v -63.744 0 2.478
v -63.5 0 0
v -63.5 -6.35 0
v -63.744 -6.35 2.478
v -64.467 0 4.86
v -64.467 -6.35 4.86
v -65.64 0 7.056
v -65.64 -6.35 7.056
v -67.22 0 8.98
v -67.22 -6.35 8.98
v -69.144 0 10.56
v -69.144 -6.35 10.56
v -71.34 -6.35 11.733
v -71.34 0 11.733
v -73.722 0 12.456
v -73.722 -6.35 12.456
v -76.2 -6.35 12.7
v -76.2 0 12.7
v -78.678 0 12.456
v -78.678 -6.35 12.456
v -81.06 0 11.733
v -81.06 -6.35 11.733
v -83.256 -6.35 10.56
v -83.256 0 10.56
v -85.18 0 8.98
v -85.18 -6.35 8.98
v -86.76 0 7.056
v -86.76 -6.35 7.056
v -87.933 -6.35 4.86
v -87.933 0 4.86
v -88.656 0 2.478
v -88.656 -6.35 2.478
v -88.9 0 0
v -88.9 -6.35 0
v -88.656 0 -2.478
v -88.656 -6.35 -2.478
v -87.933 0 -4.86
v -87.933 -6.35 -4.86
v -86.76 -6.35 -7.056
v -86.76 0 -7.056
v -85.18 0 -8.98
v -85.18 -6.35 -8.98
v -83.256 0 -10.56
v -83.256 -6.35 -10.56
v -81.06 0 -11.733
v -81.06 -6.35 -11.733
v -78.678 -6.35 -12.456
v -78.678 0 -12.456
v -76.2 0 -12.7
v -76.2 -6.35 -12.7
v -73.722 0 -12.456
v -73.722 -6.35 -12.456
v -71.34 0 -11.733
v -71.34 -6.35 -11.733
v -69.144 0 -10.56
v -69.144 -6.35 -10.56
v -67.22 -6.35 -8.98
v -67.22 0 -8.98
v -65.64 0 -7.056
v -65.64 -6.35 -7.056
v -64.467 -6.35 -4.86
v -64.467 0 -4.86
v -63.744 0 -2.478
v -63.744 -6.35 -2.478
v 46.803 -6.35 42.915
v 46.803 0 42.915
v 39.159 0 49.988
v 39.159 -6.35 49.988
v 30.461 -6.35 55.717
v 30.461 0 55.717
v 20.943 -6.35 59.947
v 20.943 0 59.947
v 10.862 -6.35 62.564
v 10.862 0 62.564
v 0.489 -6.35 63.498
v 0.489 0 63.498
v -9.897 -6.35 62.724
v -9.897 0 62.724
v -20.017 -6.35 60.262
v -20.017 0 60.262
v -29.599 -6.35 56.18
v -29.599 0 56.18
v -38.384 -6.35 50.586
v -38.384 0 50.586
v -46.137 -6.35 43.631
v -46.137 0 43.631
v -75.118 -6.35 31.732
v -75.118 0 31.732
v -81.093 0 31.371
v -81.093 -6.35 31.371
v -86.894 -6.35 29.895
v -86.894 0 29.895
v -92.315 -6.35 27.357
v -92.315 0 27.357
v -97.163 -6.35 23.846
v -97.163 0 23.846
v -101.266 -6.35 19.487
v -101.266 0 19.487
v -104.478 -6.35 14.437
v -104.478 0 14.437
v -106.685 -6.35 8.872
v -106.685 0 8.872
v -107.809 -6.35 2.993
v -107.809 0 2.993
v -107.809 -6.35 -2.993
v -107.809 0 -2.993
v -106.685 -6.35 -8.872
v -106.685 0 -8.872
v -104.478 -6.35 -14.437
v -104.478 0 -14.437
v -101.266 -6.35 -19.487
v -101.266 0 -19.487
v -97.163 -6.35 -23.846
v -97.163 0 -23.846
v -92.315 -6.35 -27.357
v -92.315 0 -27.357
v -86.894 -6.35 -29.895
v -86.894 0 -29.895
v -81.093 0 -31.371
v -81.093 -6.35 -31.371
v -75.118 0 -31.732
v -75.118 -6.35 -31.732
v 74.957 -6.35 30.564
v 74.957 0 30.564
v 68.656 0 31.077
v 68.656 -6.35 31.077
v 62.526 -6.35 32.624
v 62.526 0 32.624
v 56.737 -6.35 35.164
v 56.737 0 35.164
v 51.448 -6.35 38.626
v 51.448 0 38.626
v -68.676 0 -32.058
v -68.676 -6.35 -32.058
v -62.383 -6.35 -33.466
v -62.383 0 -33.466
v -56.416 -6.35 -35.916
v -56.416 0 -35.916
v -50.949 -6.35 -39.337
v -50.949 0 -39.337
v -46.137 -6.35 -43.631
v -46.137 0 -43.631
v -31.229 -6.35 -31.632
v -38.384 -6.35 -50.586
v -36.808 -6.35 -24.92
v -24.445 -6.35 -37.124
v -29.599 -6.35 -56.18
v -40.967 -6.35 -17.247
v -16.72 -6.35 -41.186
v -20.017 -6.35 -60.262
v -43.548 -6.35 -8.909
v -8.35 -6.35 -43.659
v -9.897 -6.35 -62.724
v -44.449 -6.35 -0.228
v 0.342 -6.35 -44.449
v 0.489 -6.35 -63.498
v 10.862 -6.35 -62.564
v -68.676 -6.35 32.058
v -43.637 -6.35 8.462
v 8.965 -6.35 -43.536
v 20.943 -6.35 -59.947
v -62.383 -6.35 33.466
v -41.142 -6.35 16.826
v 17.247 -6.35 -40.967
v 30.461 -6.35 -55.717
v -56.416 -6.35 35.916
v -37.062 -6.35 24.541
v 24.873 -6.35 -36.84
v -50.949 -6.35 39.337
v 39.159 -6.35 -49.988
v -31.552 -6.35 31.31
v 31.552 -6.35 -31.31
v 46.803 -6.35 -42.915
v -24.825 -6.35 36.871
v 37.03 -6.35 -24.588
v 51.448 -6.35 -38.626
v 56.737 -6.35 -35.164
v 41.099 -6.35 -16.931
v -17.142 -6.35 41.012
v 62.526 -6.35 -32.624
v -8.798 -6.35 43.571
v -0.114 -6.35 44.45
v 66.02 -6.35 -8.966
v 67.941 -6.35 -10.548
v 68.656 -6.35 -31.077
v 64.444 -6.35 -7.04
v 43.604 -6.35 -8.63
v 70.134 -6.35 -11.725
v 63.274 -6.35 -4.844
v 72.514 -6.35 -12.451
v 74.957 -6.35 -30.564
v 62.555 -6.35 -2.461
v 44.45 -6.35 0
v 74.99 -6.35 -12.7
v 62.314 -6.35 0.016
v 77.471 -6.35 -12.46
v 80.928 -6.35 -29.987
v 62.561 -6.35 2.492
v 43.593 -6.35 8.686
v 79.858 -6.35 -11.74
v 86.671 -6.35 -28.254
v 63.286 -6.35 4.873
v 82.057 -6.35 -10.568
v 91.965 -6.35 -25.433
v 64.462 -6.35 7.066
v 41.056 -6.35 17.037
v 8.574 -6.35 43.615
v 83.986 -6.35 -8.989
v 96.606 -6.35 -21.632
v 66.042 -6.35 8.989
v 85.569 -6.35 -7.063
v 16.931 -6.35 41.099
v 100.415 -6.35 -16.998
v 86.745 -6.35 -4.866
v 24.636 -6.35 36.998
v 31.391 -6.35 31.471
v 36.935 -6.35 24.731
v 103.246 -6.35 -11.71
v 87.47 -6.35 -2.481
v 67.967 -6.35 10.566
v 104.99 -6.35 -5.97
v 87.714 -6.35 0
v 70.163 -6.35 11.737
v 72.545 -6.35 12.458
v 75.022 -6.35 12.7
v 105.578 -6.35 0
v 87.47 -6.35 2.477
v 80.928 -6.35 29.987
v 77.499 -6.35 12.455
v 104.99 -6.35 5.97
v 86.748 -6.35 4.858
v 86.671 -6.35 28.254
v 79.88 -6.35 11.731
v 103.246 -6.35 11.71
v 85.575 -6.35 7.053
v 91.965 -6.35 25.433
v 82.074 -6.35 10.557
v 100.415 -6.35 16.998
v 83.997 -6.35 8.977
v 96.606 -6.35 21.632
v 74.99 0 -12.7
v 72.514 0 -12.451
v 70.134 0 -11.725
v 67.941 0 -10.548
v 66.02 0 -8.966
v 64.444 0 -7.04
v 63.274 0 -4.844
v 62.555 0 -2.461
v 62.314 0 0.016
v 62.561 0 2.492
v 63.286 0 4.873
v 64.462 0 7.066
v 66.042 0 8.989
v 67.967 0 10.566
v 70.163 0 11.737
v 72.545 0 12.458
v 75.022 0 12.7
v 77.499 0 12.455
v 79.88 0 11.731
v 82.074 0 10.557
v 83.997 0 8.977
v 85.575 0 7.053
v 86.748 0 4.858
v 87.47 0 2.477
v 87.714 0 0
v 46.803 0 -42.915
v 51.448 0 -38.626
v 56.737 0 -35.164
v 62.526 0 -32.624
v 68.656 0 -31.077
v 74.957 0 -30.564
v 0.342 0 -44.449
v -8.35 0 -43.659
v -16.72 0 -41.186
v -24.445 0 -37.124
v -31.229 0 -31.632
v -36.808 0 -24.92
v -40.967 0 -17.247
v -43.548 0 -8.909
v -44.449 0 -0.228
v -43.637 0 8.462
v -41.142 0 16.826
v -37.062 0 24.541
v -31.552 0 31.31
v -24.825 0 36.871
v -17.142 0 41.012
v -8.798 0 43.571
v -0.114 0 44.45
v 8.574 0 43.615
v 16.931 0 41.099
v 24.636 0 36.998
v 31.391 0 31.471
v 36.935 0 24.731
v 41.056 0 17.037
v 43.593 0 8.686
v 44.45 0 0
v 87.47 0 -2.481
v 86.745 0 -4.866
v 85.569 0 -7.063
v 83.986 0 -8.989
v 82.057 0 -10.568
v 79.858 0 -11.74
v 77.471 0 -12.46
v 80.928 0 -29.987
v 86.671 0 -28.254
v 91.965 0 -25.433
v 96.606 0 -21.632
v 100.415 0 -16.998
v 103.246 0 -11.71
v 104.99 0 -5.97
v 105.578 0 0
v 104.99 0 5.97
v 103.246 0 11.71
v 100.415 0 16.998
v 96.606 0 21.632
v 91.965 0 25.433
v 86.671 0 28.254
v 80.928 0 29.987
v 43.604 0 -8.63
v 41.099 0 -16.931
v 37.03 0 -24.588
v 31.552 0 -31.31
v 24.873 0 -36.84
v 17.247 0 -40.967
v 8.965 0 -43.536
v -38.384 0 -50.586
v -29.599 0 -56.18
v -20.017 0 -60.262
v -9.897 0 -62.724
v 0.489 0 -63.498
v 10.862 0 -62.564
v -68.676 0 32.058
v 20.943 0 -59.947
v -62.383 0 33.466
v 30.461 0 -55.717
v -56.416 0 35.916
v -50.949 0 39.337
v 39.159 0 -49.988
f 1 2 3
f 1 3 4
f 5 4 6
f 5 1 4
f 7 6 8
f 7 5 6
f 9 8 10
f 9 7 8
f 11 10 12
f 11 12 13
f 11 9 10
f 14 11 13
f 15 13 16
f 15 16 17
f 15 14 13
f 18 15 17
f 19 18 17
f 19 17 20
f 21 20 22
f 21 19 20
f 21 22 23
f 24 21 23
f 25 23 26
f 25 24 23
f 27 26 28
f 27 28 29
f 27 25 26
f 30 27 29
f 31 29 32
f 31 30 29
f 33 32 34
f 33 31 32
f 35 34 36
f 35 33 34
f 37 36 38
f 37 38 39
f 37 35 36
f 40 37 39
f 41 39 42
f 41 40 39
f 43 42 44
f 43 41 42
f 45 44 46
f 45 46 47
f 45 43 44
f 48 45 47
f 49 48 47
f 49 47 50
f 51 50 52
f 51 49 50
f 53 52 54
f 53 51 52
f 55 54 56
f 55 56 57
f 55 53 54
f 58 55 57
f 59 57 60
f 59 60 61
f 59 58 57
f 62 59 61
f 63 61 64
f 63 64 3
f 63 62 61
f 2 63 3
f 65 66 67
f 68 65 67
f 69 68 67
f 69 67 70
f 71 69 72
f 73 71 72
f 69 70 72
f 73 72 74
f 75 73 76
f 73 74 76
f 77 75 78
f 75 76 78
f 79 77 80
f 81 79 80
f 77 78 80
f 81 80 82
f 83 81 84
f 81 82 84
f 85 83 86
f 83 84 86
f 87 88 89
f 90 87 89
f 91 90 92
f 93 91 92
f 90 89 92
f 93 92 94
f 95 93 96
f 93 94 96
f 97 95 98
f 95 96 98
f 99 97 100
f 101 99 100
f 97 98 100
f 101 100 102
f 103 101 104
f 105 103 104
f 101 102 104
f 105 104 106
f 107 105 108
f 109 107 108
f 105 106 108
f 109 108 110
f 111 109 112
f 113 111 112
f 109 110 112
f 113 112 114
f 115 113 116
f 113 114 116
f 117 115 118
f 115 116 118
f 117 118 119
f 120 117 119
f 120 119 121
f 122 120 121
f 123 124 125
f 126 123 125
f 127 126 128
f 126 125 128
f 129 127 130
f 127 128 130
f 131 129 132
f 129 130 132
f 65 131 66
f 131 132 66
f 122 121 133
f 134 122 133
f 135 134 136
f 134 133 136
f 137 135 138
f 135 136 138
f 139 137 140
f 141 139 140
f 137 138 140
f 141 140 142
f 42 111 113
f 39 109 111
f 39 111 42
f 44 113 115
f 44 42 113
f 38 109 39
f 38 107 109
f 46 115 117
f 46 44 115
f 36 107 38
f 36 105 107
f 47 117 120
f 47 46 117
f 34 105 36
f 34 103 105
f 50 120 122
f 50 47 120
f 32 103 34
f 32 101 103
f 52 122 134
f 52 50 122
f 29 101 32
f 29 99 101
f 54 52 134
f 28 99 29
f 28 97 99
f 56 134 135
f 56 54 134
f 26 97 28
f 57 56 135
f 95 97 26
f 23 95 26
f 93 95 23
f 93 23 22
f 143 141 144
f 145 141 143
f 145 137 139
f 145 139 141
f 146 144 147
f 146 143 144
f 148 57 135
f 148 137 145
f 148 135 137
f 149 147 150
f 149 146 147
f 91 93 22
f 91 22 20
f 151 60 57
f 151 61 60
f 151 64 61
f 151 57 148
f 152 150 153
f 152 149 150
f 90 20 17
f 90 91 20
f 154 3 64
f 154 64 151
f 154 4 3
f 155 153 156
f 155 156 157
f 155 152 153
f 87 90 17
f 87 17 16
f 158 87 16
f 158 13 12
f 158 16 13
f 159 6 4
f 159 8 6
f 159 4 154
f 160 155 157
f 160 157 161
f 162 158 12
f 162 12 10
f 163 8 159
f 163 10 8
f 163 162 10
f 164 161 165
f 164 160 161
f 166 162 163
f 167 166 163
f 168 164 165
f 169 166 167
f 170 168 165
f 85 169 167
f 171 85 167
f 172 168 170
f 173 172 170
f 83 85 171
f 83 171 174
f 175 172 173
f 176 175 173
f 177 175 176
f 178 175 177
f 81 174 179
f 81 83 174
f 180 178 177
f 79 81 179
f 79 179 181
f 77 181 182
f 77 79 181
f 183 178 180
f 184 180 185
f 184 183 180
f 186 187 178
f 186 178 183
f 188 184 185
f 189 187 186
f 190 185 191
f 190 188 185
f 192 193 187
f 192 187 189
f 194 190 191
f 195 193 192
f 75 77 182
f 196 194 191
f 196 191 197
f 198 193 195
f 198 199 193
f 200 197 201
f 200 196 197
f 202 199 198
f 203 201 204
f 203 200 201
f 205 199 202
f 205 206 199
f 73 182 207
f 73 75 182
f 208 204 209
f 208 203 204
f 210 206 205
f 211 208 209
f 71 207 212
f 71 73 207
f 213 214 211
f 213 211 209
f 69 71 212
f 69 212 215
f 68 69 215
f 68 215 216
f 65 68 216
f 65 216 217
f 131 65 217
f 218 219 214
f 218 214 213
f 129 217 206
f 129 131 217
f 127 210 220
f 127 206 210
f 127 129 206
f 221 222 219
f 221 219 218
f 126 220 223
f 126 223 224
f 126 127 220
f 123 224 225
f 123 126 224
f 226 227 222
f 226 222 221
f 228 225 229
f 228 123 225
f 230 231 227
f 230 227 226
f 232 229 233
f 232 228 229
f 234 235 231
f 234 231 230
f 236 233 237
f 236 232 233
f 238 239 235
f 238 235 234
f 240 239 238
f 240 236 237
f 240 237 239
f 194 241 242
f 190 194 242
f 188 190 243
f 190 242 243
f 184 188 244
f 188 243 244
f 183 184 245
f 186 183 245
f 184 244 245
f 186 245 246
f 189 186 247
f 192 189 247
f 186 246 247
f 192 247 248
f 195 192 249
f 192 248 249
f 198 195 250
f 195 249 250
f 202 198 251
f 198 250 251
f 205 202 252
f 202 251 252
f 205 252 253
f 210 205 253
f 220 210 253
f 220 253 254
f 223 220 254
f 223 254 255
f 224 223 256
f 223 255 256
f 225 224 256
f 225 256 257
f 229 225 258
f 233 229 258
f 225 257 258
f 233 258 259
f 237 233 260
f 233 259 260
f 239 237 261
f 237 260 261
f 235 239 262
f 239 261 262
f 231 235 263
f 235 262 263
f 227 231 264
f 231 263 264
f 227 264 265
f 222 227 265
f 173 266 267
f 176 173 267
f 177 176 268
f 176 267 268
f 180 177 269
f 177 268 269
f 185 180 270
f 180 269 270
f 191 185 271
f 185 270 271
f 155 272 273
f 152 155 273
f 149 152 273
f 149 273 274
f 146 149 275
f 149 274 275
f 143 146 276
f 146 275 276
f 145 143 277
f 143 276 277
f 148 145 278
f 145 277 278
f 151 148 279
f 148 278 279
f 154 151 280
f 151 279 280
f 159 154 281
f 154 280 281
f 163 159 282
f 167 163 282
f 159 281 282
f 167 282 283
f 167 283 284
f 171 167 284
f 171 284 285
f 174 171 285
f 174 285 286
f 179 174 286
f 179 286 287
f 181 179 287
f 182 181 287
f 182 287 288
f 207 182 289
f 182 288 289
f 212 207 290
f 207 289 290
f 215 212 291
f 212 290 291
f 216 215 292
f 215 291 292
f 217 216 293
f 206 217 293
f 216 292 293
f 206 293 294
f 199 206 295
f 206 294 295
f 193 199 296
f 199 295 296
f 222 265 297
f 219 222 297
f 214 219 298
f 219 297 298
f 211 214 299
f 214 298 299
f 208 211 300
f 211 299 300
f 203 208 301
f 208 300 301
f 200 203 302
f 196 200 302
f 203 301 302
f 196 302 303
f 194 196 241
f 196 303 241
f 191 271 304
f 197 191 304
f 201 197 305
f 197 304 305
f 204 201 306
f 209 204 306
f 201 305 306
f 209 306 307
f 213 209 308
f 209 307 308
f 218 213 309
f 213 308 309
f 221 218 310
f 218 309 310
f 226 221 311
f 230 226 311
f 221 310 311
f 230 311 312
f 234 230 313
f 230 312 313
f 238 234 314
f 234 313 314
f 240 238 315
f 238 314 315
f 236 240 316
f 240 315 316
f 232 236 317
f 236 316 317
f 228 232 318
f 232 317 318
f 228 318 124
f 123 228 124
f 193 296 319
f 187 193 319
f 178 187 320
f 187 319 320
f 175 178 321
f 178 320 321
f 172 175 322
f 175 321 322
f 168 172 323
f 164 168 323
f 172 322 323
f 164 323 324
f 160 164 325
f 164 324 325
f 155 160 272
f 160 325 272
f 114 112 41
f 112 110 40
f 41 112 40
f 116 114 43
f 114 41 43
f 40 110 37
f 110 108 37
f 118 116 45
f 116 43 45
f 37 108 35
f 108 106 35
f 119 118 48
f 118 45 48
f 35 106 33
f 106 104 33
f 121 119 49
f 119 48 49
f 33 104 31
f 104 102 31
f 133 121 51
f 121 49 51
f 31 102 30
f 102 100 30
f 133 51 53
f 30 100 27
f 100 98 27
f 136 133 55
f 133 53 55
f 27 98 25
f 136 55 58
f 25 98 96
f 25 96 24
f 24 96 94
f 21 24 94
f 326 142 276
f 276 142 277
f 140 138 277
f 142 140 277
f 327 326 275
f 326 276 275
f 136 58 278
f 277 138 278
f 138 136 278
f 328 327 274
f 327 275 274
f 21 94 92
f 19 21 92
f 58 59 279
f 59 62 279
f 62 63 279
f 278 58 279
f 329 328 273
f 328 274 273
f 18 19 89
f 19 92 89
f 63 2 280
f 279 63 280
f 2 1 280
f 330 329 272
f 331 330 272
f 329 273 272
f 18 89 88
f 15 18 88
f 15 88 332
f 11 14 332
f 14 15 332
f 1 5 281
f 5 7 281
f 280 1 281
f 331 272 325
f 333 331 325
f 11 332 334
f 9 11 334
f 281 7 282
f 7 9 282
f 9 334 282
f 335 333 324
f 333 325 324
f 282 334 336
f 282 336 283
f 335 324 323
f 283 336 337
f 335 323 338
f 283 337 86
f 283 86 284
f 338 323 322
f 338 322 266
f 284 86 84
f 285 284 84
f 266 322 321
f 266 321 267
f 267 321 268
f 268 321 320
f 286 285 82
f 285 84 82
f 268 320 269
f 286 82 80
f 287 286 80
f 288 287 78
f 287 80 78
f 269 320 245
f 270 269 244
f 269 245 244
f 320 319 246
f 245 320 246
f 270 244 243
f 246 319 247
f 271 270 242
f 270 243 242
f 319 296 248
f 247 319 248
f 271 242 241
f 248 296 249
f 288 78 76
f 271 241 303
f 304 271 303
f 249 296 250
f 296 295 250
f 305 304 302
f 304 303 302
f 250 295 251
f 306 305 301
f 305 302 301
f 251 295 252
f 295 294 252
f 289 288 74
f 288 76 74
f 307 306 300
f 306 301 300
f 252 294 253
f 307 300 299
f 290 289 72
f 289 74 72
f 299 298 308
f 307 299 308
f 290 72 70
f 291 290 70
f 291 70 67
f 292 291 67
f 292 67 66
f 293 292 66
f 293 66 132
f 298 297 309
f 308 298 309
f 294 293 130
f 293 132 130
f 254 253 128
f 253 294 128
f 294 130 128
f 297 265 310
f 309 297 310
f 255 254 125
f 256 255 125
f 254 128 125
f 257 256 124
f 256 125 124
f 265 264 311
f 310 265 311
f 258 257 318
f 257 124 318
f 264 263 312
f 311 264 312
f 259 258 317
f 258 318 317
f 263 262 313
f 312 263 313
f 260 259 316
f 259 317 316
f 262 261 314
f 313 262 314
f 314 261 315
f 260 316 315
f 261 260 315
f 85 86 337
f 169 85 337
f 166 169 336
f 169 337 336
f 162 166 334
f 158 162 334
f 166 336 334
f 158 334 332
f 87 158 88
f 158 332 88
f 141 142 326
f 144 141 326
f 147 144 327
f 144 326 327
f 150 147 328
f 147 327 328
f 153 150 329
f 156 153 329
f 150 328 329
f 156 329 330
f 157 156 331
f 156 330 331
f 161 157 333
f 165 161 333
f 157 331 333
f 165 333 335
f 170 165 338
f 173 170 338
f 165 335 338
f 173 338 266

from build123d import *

# Parameters (mm, degrees)
F0_R     = 12.7
F1_DEPTH = 6.35


# Not quite as in the source:
# - a length typed as a fraction of an inch, garbled in the dataset ("3 / 203.2 mm" for 3/8 in), is restored


with BuildPart() as f1:
    # F0 (on Front) → F1 (new body)
    with BuildSketch(Plane.XZ):
        with BuildLine():
            ThreePointArc((-46.13671875, -43.6308741946), (-24.8918341596, -58.4178619274), (0.4890866537, -63.4981164622))
            ThreePointArc((0.4890866537, -63.4981164622), (25.7887406506, -58.0275008566), (46.8033281156, -42.9150145905))
            ThreePointArc((46.8033281156, -42.9150145905), (59.5789989506, -33.7738186545), (74.9568035052, -30.5640903944))
            ThreePointArc((74.9568035052, -30.5640903944), (105.5782883644, 0), (74.9568035052, 30.5640903944))
            ThreePointArc((74.9568035052, 30.5640903944), (59.5789989506, 33.7738186545), (46.8033281156, 42.9150145905))
            ThreePointArc((46.8033281156, 42.9150145905), (0.4890866537, 63.4981164622), (-46.13671875, 43.6308741946))
            ThreePointArc((-46.13671875, 43.6308741946), (-59.3475236203, 34.5646316236), (-75.1176136364, 31.7315448688))
            ThreePointArc((-75.1176136364, 31.7315448688), (-107.95, 0), (-75.1176136364, -31.7315448688))
            ThreePointArc((-75.1176136364, -31.7315448688), (-59.3475236203, -34.5646316236), (-46.13671875, -43.6308741946))
        make_face()
        with Locations((-76.2, 0)):
            Circle(F0_R, mode=Mode.SUBTRACT)
        with BuildLine():
            ThreePointArc((0.3423606576, -44.4486815235), (-31.5517070159, 31.3096196781), (44.45, 0))
            ThreePointArc((44.45, 0), (31.5517070159, -31.3096196781), (0.3423606576, -44.4486815235))
        make_face(mode=Mode.SUBTRACT)
        with BuildLine():
            ThreePointArc((87.7141441822, 0), (83.9859725242, -8.9886759982), (74.9903180088, -12.6999776501))
            ThreePointArc((74.9903180088, -12.6999776501), (66.0423158402, 8.9886759982), (87.7141441822, 0))
        make_face(mode=Mode.SUBTRACT)
    extrude(amount=F1_DEPTH)


solid = f1.part
